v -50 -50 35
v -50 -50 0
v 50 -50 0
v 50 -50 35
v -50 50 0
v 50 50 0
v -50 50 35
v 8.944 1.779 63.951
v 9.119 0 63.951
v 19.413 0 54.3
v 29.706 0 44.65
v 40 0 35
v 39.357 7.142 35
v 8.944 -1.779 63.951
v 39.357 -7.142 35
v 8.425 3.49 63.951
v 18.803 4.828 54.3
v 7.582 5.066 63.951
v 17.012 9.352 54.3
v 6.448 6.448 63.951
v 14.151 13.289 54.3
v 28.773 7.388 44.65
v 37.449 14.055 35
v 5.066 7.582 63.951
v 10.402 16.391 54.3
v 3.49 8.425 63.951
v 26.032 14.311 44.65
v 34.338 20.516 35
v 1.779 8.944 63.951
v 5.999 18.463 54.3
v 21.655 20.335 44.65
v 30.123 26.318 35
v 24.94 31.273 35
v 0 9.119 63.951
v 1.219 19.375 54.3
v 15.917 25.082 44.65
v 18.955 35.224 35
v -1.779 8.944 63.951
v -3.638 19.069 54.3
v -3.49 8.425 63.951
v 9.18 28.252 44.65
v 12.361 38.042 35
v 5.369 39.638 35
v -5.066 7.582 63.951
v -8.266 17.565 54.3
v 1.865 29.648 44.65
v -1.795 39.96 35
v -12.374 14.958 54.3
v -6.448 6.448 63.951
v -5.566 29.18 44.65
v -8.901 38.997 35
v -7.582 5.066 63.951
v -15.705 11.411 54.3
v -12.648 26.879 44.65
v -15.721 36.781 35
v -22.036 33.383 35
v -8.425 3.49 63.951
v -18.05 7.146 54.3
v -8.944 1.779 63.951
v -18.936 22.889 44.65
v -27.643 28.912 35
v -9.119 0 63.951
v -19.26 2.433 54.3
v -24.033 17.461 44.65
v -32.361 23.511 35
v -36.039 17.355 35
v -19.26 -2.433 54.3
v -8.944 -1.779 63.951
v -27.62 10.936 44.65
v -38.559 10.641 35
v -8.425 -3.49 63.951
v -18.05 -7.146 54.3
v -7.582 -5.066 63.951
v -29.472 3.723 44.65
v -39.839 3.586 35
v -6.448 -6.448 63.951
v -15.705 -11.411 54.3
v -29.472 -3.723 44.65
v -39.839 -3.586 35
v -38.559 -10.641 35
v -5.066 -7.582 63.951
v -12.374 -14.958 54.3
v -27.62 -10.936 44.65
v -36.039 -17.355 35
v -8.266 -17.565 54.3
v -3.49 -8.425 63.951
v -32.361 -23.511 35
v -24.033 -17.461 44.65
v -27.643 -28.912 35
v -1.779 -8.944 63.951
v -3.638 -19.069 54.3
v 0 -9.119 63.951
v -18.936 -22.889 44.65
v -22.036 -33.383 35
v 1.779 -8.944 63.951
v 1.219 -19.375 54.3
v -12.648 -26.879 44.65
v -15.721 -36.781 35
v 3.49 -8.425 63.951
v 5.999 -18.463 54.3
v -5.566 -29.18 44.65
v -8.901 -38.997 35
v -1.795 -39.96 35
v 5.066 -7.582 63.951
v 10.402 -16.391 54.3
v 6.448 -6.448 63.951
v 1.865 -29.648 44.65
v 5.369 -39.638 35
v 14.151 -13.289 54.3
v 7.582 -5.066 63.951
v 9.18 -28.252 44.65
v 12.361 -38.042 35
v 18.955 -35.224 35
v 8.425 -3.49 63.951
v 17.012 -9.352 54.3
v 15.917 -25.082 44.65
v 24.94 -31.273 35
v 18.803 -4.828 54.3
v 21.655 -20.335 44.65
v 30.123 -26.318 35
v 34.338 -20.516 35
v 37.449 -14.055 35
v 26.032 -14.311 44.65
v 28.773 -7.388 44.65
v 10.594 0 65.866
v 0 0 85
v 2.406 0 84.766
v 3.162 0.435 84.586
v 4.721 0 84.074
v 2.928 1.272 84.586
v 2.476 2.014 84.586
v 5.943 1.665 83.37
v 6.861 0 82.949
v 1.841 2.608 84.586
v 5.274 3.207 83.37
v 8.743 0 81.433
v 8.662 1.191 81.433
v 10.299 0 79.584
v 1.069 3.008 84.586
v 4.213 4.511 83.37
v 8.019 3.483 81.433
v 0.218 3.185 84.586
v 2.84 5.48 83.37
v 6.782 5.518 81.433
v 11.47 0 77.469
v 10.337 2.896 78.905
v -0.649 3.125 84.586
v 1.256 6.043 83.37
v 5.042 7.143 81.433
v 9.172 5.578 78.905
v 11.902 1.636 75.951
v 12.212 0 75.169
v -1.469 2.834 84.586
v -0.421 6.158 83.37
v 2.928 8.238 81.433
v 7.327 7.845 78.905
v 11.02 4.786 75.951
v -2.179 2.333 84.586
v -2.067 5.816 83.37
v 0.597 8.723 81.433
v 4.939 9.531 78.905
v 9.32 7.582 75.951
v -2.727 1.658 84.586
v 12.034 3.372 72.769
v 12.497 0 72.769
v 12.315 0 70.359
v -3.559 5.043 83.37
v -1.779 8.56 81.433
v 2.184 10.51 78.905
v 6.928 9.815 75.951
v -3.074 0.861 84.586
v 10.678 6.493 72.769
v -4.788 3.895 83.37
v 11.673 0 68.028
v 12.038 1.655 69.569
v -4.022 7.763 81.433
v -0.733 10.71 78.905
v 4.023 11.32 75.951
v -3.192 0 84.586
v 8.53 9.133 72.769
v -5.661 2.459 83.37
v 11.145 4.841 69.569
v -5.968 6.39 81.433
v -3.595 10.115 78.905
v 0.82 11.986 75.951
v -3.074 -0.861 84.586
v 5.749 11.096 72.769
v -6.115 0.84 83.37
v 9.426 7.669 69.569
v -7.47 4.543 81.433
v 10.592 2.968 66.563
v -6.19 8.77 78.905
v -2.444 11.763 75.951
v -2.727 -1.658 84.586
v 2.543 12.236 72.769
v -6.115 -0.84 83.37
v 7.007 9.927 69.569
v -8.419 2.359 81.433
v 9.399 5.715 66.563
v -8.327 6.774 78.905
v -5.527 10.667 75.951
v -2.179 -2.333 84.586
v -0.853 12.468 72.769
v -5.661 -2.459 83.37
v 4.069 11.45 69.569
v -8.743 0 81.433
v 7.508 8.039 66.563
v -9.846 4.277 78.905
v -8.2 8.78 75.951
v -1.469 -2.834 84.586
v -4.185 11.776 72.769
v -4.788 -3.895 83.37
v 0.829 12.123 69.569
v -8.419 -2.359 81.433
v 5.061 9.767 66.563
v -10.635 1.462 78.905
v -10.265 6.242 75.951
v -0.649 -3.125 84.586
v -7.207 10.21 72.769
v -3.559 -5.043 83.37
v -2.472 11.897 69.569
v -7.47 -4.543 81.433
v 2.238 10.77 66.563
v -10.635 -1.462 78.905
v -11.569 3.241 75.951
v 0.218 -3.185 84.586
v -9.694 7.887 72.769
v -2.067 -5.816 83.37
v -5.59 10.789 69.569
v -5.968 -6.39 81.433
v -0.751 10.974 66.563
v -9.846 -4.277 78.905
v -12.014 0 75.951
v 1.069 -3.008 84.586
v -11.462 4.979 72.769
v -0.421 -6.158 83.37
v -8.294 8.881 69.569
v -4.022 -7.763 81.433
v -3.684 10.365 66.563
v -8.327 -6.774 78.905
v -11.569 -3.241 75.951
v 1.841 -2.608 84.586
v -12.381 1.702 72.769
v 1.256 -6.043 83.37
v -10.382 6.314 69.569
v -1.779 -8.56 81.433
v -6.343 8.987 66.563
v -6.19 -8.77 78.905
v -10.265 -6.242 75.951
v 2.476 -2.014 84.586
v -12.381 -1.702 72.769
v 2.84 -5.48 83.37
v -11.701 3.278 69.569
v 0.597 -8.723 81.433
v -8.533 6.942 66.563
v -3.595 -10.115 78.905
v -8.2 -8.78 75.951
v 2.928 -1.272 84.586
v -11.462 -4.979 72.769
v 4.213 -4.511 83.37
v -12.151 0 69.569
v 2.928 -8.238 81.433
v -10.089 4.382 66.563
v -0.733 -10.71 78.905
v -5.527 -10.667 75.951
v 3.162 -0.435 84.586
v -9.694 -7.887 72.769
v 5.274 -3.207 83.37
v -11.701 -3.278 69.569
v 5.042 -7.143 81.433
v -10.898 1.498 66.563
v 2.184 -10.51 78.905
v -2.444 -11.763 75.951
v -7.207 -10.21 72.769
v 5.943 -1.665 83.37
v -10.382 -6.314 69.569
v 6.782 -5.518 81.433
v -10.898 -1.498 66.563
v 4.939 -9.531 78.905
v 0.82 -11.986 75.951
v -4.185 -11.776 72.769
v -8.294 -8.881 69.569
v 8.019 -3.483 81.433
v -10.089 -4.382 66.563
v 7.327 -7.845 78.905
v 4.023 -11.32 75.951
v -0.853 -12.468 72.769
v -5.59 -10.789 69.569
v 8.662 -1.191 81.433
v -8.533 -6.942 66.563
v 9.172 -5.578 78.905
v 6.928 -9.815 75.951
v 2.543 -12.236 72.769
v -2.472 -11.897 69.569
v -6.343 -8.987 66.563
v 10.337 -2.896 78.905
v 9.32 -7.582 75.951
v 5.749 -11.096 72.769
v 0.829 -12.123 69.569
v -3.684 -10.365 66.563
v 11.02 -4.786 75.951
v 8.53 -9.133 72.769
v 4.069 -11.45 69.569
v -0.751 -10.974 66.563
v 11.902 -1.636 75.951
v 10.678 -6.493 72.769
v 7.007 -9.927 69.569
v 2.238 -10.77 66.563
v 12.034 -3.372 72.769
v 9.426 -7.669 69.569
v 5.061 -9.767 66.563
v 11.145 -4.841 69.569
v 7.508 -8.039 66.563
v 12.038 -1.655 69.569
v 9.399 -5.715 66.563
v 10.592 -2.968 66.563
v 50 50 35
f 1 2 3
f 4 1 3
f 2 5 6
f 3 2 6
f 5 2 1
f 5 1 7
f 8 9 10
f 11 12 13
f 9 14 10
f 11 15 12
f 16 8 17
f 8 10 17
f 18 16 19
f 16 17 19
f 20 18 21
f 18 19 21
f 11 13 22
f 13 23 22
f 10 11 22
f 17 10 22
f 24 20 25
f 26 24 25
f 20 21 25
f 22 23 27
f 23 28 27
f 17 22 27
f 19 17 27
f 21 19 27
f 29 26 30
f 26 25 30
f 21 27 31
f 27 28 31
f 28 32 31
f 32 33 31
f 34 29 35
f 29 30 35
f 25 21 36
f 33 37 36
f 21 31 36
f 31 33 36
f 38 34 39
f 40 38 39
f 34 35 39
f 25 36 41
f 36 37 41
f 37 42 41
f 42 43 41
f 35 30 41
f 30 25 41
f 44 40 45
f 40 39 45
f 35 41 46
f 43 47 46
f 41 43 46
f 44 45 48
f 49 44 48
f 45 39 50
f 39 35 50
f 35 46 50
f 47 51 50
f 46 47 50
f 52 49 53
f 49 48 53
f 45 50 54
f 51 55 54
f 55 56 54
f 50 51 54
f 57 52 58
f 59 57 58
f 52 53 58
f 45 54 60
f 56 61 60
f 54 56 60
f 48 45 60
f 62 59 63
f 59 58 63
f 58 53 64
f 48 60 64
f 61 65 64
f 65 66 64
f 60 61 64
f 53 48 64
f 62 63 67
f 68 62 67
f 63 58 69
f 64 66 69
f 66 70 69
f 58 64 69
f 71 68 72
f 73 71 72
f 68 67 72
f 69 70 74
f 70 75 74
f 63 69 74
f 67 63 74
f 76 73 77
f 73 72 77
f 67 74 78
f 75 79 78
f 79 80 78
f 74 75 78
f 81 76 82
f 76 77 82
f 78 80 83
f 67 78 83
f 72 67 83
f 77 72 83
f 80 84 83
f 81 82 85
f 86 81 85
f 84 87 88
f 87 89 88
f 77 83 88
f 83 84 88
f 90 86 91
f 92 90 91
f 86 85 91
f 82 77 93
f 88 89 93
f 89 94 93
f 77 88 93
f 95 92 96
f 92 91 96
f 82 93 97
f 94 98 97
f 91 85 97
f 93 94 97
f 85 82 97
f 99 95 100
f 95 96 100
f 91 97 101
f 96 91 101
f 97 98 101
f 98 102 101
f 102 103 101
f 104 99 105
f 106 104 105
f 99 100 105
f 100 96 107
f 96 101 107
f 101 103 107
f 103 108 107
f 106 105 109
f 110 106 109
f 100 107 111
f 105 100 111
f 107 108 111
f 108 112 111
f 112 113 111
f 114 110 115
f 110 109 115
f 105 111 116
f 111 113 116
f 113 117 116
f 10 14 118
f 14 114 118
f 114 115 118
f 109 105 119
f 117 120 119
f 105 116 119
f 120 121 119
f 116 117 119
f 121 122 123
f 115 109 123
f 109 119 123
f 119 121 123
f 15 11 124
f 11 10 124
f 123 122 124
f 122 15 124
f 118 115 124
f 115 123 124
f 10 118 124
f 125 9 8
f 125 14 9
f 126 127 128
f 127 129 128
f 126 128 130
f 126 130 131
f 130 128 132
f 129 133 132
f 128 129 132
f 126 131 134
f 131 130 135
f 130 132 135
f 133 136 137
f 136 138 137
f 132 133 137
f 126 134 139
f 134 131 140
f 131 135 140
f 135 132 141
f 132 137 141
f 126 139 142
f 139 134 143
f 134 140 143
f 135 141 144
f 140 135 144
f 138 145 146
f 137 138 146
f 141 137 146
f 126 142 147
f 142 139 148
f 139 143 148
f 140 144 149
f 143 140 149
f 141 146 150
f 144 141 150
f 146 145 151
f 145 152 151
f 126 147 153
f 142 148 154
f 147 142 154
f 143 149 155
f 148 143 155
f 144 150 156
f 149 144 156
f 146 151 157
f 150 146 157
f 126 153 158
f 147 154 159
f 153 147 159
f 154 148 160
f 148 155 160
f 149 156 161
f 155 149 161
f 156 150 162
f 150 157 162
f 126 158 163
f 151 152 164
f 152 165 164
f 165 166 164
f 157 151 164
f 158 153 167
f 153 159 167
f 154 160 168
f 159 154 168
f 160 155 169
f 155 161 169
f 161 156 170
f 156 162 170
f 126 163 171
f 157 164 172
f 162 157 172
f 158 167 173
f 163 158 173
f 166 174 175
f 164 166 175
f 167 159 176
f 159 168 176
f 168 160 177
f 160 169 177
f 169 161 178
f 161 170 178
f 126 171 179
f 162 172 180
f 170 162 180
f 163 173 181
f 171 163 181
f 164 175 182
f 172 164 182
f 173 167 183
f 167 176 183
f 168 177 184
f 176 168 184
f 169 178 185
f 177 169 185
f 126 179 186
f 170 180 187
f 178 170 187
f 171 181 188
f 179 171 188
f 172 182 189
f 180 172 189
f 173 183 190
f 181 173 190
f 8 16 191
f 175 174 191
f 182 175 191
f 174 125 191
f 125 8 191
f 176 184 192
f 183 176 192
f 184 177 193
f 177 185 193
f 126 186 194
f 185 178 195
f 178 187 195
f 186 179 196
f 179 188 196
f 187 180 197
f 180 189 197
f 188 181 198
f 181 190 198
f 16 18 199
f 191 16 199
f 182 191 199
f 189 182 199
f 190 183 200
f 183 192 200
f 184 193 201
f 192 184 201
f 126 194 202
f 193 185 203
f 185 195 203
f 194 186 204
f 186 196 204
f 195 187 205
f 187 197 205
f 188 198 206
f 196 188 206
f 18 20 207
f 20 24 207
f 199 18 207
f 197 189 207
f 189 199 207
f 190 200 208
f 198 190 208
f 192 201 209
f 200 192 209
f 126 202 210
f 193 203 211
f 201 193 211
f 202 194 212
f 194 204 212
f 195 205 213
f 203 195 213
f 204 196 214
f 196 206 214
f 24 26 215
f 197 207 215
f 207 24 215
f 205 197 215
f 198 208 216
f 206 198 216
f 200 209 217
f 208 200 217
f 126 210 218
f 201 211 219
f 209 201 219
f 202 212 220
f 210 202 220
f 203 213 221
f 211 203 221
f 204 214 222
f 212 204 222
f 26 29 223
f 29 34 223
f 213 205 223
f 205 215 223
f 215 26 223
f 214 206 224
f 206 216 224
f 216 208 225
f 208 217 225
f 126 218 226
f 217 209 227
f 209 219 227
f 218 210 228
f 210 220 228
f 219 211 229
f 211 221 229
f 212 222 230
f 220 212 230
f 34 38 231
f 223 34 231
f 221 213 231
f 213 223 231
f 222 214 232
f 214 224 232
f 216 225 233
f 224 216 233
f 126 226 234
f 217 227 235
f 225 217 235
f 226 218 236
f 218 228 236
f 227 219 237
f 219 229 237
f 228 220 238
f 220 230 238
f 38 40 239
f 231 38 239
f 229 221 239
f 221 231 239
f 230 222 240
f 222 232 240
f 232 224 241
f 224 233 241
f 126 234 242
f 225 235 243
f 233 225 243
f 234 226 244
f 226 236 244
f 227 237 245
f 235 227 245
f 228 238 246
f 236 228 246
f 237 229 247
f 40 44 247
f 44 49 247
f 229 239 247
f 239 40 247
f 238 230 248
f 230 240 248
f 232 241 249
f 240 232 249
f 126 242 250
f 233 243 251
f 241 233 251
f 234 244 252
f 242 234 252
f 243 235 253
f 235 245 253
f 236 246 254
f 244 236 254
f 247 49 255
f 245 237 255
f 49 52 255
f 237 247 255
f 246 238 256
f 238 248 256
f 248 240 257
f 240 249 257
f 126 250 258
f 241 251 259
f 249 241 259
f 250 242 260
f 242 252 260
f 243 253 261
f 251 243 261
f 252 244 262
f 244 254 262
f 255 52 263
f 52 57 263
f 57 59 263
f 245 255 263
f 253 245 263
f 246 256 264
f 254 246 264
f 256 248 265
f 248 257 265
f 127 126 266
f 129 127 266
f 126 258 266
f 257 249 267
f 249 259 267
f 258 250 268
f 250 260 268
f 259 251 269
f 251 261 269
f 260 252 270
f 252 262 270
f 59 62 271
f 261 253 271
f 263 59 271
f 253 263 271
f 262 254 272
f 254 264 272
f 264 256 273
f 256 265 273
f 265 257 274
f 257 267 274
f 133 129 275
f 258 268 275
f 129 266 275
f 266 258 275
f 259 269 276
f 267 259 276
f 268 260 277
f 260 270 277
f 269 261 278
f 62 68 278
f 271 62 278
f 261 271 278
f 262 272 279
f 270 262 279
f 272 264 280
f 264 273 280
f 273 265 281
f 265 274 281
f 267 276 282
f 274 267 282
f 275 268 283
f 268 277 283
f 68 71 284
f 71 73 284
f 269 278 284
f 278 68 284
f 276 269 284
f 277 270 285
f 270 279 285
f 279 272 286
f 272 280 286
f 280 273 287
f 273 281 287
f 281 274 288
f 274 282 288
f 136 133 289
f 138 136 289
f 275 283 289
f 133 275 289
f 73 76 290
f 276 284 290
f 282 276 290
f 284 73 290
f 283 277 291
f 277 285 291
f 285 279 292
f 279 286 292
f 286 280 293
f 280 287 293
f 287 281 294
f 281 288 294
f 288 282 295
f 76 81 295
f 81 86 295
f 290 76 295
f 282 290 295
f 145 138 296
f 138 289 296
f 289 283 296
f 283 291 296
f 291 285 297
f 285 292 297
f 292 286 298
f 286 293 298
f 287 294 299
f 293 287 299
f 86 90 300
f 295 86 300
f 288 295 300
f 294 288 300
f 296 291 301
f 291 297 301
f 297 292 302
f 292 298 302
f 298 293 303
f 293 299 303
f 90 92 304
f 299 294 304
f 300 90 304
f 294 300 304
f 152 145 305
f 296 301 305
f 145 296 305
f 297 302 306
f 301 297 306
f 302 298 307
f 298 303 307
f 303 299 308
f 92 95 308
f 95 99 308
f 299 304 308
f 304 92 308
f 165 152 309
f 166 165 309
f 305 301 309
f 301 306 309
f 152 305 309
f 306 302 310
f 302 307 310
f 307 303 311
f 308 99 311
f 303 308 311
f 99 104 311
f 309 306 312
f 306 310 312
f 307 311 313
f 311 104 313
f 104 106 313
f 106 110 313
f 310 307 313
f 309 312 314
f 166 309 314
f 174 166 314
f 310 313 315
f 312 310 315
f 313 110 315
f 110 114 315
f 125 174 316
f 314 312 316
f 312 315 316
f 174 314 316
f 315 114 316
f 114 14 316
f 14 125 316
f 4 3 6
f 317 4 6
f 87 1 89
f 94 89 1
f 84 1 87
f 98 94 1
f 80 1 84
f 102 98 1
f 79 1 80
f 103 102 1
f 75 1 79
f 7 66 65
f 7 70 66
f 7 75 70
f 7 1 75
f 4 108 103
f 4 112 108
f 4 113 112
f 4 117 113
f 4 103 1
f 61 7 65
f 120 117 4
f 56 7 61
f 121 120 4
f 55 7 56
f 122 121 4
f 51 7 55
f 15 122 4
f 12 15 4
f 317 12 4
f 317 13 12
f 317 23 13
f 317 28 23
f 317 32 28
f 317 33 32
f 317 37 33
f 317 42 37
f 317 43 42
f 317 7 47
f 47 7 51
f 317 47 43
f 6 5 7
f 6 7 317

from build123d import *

# Parameters (mm, degrees)
SKETCH1_W           = 100
SKETCH1_H           = 100
BOSS_EXTRUDE1_DEPTH = 35


with BuildPart() as part:
    # Sketch1 → Boss-Extrude1 (new body)
    with BuildSketch(Plane.XY):
        Rectangle(SKETCH1_W, SKETCH1_H)
    extrude(amount=BOSS_EXTRUDE1_DEPTH)

    # Sketch2 → Revolve1 (revolve)
    with BuildSketch(Plane(origin=(0, 0, 0), x_dir=(1, 0, 0), z_dir=(0, 1, 0))):
        with BuildLine():
            Line((0, -35), (0, -72.5))
            Line((0, -72.5), (0, -85))
            ThreePointArc((0, -85), (11.469869254, -77.469114539), (9.119215052, -63.950735889))
            Line((9.119215052, -63.950735889), (40, -35))
            Line((40, -35), (0, -35))
        make_face()
    revolve(axis=Axis((0, 0, 35), (0, 0, 1)))


solid = part.part
